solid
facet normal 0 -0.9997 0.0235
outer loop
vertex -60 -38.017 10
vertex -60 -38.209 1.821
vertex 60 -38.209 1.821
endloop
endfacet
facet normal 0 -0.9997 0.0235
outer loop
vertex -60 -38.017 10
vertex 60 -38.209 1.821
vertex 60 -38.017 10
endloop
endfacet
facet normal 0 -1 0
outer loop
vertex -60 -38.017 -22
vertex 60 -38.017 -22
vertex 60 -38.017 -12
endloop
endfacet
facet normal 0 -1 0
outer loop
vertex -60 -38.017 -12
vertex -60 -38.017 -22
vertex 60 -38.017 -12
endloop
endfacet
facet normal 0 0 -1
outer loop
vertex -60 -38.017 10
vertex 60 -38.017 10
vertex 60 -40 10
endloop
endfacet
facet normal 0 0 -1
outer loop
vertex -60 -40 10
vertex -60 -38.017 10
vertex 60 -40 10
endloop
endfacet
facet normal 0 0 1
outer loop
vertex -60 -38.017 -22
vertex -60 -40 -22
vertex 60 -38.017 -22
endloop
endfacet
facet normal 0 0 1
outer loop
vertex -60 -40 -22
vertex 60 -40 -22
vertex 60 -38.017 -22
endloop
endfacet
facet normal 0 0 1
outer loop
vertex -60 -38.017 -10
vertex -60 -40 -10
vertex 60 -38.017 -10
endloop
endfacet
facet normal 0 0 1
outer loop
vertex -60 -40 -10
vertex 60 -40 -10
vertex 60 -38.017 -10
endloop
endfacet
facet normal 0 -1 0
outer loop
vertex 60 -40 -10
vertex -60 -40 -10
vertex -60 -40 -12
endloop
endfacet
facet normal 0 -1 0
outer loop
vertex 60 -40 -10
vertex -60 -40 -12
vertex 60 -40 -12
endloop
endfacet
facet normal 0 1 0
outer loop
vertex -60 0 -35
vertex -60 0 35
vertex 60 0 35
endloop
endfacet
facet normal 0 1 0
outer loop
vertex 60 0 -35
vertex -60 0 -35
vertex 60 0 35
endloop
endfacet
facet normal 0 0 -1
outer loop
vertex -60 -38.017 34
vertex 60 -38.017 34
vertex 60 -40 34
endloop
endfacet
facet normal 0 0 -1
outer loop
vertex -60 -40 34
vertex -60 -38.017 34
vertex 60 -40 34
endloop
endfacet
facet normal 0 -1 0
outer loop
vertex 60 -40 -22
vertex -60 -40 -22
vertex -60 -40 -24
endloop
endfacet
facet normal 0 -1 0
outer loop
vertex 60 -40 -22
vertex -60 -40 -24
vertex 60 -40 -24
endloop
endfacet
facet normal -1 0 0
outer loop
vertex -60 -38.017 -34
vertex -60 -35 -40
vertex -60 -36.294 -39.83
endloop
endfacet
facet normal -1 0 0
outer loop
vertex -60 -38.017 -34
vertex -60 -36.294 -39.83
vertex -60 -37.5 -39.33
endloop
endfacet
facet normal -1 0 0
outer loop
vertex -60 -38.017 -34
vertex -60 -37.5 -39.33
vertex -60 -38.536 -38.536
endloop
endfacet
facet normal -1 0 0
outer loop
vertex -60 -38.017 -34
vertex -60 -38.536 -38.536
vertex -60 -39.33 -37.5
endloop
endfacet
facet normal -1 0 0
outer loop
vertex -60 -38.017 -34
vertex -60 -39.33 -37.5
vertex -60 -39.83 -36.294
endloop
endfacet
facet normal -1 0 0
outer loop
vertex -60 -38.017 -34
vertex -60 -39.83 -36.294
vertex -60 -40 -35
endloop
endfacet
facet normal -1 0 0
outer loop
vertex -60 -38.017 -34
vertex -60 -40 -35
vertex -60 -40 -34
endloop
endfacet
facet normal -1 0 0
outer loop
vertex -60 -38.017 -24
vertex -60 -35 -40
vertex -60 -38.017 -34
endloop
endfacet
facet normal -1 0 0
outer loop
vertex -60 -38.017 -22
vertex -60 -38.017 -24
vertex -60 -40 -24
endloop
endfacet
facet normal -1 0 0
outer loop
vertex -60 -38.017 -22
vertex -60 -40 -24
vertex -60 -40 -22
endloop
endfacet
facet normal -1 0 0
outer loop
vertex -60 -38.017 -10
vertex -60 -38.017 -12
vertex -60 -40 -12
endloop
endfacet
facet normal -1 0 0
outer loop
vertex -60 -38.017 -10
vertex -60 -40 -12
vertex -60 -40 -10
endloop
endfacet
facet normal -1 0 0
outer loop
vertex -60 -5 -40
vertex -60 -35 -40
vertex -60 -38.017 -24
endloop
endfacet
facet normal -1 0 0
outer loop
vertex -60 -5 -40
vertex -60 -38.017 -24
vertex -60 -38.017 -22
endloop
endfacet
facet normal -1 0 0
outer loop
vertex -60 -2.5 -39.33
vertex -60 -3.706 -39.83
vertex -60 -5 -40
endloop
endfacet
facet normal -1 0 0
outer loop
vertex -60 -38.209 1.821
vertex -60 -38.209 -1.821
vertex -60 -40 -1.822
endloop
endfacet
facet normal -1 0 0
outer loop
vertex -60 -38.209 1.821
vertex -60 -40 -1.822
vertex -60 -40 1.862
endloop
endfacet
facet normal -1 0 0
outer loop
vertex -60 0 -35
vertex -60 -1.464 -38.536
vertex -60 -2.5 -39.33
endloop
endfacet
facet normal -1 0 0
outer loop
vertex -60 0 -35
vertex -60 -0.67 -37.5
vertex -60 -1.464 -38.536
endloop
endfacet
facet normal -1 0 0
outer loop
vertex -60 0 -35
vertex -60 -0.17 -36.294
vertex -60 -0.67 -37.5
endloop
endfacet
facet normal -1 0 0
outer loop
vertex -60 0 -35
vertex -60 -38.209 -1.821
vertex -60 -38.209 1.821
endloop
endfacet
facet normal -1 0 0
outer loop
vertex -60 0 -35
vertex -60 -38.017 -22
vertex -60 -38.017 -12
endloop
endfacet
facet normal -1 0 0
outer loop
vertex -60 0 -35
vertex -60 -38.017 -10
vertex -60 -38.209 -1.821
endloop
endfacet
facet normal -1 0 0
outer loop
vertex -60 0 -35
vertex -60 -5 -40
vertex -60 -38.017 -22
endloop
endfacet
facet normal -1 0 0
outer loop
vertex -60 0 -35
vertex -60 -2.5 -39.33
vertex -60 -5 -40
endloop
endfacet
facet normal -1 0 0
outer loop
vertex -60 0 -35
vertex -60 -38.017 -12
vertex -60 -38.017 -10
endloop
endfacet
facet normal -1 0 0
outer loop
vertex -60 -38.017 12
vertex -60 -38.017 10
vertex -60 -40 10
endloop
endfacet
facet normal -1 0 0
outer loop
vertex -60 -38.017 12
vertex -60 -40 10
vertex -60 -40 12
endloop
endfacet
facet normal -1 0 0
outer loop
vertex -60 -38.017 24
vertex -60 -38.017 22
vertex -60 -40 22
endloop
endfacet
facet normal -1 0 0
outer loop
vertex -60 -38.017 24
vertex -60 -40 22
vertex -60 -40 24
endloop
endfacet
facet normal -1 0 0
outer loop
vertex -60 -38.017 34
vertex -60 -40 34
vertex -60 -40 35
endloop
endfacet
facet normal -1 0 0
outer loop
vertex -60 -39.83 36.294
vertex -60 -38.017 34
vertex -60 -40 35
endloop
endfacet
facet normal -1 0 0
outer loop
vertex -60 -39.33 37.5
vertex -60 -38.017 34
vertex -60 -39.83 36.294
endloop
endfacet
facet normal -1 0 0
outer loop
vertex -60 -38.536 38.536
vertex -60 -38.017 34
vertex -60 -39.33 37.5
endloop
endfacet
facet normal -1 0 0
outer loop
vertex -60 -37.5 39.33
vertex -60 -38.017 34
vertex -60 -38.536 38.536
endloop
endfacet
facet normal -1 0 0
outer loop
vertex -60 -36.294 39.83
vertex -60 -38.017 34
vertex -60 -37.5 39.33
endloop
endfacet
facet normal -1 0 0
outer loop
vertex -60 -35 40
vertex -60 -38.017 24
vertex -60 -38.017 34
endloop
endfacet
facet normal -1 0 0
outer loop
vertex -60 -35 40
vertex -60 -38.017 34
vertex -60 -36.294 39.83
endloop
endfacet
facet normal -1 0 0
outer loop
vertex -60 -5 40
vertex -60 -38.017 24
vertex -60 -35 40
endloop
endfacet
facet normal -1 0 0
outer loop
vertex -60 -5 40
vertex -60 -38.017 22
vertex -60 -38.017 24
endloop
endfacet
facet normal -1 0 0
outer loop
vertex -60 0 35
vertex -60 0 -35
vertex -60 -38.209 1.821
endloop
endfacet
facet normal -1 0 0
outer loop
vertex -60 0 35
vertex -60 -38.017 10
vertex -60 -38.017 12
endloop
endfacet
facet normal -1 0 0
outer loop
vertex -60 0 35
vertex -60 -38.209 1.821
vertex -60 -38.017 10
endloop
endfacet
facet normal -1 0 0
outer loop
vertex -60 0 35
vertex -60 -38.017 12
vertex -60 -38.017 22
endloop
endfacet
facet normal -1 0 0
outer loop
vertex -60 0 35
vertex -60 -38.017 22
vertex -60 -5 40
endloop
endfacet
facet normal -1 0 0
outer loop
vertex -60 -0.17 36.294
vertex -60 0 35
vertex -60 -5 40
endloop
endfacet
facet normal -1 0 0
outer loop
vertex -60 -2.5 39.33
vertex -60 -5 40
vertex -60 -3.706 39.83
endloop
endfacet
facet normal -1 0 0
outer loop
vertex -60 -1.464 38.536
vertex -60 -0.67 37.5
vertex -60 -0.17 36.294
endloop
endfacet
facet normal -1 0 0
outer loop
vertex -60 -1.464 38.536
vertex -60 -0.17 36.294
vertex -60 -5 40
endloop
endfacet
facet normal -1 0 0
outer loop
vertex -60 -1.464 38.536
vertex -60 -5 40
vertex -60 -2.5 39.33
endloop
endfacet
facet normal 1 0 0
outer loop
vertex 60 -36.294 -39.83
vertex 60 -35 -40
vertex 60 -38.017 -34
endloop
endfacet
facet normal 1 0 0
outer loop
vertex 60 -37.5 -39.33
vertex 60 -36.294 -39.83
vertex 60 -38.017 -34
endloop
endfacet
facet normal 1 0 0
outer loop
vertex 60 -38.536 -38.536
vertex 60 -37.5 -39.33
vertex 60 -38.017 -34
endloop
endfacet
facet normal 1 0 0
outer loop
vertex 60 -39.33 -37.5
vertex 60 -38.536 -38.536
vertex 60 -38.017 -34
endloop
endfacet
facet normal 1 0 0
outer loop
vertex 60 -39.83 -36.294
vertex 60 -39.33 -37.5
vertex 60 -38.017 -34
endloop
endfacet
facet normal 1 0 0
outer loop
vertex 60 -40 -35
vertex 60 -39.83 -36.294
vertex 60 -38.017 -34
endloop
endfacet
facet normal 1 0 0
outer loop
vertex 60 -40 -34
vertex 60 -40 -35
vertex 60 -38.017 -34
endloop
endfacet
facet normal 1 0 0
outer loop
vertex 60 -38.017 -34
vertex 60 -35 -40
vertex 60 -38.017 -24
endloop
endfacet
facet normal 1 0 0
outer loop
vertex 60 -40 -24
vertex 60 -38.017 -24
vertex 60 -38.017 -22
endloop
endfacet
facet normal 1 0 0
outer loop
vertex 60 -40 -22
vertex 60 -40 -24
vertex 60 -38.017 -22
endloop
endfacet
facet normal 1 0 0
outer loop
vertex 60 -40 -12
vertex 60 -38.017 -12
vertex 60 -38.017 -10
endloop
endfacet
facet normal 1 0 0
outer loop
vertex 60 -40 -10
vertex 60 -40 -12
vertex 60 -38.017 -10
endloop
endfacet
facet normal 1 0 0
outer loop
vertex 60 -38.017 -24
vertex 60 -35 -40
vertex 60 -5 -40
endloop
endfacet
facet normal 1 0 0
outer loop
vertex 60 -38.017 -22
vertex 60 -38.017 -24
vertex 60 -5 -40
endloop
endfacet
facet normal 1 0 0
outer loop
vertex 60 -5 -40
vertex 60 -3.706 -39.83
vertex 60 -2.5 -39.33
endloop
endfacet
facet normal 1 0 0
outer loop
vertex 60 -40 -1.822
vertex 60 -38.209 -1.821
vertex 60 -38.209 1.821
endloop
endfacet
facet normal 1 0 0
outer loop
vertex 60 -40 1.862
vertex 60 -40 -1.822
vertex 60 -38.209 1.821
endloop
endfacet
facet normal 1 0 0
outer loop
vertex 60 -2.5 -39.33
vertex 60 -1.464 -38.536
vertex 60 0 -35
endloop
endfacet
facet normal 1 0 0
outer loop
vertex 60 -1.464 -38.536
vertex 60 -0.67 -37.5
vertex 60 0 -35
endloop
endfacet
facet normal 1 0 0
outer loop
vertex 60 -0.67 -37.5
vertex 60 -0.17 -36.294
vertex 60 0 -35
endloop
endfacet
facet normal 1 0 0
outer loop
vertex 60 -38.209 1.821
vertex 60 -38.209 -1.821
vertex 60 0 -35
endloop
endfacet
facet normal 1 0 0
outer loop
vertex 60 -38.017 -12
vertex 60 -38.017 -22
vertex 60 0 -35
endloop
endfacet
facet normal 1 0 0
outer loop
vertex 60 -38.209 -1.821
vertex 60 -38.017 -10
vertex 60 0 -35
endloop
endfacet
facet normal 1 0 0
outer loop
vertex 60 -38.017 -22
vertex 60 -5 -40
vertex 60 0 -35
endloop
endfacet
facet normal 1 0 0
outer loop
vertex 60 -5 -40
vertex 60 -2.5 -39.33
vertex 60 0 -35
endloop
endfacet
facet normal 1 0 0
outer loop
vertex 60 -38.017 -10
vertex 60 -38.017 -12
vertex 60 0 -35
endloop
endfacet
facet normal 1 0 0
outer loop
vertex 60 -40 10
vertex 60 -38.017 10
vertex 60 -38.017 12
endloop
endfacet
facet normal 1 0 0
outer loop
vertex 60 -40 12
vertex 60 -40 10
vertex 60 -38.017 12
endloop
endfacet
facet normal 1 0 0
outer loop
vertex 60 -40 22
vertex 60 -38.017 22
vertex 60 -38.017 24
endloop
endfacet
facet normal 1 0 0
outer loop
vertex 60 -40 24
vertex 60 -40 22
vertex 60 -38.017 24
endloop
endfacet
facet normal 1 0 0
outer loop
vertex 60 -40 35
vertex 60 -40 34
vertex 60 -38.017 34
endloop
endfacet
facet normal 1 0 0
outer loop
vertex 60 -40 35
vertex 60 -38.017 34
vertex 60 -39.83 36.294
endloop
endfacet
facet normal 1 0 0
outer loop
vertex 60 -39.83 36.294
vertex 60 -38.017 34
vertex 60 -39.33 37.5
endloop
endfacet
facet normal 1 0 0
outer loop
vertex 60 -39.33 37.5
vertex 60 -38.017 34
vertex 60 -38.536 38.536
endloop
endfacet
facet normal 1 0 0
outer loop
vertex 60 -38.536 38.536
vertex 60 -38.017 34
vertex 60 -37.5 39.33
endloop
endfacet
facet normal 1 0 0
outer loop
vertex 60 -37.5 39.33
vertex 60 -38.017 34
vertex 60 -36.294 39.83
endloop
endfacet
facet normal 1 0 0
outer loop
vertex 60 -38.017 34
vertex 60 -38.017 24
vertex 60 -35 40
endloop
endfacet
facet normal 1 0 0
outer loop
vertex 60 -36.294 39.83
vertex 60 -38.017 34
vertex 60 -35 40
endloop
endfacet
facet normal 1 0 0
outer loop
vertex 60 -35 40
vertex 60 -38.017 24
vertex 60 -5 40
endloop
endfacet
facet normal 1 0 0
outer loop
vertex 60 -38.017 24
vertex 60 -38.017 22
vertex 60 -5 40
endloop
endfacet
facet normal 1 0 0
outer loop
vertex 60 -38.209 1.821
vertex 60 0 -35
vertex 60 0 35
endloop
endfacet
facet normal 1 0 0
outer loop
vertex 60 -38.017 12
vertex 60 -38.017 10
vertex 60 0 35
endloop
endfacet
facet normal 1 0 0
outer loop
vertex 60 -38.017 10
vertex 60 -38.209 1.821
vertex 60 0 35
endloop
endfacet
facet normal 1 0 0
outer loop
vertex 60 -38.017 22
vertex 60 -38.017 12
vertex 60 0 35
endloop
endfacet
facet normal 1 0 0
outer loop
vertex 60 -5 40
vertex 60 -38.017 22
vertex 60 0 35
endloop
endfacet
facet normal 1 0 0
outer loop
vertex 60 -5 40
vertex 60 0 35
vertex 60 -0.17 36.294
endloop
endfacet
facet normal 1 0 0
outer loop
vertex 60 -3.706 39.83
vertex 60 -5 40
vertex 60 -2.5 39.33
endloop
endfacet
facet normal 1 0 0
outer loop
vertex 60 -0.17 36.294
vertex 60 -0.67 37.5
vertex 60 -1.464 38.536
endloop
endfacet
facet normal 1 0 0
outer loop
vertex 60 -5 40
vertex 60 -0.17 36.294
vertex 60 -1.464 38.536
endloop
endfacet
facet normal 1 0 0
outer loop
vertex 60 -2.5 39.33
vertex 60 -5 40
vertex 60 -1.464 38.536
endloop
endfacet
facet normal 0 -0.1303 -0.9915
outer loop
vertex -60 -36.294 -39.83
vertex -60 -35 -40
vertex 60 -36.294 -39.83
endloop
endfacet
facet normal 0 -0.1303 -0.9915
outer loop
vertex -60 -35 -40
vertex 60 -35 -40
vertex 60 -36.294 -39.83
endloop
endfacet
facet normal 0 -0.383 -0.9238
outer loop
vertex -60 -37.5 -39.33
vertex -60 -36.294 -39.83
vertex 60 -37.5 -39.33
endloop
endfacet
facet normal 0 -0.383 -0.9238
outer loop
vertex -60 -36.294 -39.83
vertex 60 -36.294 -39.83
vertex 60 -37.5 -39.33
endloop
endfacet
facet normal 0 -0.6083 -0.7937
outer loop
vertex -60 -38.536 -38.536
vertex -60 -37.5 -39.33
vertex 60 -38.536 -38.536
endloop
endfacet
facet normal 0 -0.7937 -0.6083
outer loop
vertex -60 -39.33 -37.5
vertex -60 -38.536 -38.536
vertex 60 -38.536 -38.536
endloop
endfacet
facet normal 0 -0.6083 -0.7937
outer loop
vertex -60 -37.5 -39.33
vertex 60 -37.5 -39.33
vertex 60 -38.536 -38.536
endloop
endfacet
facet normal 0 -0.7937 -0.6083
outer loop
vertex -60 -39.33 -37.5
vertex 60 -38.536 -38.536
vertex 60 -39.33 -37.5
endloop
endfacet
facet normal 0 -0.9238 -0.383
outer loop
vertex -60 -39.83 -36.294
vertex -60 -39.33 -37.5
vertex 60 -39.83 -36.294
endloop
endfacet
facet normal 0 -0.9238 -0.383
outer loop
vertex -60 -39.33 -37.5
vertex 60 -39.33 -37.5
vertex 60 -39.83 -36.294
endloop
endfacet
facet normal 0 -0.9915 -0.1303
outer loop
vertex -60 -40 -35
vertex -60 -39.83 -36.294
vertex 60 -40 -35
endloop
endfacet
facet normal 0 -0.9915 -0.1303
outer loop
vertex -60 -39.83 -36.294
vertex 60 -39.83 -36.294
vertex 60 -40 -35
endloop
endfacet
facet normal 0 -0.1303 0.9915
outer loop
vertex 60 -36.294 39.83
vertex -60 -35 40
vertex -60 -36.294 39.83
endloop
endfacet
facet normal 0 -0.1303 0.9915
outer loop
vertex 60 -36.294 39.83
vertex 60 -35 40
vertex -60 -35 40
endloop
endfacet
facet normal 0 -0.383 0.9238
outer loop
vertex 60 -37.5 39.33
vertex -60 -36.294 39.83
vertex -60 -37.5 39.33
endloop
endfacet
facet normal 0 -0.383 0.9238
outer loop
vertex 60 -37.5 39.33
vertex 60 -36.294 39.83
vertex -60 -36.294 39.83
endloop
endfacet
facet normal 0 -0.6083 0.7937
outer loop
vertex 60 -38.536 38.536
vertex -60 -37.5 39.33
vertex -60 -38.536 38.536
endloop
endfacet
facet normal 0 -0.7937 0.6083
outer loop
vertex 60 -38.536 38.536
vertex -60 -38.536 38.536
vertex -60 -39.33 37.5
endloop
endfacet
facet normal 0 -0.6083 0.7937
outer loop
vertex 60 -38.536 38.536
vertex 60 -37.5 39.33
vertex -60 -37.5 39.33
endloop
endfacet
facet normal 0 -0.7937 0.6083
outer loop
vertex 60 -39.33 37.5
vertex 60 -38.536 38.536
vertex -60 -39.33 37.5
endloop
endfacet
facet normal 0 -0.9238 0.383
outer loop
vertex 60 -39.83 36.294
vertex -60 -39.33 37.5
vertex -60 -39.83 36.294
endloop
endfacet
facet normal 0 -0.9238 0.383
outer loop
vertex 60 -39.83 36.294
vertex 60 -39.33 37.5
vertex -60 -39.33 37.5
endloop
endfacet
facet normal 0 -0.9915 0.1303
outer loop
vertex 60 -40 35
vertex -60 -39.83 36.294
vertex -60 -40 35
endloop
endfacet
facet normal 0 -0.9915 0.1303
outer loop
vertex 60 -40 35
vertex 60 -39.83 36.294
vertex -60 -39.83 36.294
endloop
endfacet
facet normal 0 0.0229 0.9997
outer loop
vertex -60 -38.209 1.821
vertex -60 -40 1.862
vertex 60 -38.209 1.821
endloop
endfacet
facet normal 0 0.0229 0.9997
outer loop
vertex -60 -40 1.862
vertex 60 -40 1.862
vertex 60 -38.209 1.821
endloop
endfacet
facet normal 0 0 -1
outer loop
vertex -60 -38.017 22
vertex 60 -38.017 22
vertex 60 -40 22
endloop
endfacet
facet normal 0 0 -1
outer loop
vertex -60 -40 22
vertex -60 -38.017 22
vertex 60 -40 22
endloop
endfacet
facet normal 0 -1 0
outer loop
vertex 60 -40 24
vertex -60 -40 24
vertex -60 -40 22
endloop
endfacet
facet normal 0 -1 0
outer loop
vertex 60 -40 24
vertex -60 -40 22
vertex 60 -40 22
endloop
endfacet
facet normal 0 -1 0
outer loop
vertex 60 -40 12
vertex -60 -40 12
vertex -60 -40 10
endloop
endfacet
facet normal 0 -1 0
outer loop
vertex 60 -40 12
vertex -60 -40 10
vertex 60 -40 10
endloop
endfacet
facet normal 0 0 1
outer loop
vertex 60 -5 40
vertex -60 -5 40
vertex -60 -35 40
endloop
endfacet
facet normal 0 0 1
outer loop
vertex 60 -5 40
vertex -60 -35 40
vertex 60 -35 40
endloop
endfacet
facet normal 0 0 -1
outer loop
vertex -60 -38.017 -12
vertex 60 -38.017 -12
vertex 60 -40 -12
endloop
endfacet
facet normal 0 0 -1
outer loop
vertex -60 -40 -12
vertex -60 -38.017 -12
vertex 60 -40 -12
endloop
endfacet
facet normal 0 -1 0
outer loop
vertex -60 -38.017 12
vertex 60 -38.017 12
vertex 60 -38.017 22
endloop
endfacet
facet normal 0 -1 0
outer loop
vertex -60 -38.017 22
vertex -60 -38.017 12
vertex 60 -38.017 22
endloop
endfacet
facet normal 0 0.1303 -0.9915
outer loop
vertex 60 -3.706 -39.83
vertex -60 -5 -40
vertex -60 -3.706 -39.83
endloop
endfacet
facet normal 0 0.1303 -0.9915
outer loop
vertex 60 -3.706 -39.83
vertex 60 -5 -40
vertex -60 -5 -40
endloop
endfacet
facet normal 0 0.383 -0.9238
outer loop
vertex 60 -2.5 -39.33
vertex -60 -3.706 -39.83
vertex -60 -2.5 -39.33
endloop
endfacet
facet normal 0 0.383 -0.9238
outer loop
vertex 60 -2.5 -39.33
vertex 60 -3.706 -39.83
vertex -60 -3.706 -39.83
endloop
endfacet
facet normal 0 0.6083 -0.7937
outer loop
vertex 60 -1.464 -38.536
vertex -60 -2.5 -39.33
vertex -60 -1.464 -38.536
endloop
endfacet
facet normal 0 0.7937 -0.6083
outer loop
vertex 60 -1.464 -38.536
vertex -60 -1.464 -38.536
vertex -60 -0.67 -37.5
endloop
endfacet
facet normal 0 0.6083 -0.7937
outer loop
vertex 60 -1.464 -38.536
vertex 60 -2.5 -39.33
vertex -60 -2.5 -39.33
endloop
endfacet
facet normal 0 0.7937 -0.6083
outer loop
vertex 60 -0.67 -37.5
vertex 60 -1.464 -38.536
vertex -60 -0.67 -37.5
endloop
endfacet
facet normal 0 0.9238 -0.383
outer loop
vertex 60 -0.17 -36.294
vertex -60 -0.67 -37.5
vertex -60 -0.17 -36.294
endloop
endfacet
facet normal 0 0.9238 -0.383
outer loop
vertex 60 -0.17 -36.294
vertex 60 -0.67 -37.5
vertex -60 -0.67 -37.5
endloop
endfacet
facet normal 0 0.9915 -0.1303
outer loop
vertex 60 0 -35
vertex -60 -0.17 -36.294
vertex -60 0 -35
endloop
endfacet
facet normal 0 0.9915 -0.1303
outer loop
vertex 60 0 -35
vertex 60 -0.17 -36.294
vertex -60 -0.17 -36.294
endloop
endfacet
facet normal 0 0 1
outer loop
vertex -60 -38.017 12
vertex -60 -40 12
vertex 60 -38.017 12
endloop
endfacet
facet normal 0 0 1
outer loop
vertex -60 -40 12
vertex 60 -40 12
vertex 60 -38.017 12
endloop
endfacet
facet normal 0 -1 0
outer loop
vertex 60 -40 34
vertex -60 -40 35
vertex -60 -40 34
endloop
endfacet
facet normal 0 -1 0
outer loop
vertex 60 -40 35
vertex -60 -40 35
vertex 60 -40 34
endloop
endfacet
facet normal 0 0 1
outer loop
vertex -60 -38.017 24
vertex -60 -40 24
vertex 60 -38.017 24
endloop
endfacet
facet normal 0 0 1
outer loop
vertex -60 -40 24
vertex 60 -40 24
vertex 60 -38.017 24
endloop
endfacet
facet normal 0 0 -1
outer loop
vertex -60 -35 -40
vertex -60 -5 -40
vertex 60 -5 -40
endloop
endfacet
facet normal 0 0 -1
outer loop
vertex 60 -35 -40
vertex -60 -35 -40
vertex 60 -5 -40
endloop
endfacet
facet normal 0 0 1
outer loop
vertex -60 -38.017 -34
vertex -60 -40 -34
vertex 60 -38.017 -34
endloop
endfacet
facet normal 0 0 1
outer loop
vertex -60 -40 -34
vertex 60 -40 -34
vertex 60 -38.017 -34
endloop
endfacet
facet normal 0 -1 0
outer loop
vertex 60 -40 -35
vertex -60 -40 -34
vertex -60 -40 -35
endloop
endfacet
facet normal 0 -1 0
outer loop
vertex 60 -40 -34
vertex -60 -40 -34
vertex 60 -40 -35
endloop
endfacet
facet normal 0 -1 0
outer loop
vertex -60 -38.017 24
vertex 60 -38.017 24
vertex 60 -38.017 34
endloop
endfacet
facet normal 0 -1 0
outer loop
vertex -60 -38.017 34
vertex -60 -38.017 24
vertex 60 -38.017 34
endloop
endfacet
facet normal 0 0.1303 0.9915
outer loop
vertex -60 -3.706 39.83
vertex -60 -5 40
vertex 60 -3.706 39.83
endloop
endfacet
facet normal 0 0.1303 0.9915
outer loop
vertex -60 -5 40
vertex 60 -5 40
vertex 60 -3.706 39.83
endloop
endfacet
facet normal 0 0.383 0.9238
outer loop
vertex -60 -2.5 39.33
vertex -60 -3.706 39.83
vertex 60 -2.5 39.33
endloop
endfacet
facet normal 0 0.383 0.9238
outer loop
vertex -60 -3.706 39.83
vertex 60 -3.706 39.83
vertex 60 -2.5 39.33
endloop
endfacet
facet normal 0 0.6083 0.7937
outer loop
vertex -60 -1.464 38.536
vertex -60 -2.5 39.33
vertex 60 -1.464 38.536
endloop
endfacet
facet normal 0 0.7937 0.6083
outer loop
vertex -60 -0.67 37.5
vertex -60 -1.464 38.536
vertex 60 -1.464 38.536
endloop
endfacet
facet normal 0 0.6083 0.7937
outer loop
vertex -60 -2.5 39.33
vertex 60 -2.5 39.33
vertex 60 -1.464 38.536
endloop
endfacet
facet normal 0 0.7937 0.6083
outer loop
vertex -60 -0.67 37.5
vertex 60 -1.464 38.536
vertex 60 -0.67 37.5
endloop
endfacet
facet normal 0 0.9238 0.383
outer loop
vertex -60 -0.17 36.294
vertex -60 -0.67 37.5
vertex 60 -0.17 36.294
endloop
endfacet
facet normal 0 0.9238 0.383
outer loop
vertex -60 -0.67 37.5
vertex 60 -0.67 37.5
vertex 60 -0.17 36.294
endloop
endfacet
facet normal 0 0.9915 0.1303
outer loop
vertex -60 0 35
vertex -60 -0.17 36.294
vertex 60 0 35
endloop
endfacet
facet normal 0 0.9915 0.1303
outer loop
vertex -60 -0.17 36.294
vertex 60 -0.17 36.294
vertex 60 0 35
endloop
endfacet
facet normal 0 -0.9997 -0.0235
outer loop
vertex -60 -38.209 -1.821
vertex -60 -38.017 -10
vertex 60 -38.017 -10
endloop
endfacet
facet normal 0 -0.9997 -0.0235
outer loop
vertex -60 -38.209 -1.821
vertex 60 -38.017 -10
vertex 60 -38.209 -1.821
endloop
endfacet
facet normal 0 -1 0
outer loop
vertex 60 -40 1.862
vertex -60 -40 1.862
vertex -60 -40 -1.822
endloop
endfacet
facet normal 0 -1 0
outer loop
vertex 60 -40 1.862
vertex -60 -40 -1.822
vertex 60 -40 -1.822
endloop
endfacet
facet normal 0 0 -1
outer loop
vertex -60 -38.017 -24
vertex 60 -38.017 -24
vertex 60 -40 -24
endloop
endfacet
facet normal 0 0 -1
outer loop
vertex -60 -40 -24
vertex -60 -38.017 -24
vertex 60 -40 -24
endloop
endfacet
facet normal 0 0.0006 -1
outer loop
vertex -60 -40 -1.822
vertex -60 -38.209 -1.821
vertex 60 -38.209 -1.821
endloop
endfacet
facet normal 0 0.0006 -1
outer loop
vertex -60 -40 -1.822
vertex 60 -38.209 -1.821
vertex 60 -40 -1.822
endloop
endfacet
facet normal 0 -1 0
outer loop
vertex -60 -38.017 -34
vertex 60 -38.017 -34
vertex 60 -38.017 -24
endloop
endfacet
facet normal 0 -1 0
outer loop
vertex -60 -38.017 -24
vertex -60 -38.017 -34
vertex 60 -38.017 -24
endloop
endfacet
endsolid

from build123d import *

# Parameters (mm, degrees)
F0_W     = 120
F0_H     = 80
F1_DEPTH = 40
F2_R     = 5
F4_DEPTH = 100


with BuildPart() as f1:
    # F0 (on Front) → F1 (new body)
    with BuildSketch(Plane.XZ):
        Rectangle(F0_W, F0_H)
    extrude(amount=F1_DEPTH)

    # F2
    f2_edges = [f1.edges().sort_by_distance(p)[0] for p in [
        (0, -40, 40),
        (0, -40, -40),
        (0, 0, 40),
        (0, 0, -40),
    ]]
    fillet(f2_edges, radius=F2_R)

    # F3 (on Right) → F4 (cut, symmetric)
    with BuildSketch(Plane.YZ):
        Polygon((-41.373981, 1.894575), (-38.208514, 1.82053), (-38.017184, 10), (-41.193411, 10), (-41.193411, 12), (-38.017184, 12), (-38.017184, 22), (-41.193411, 22), (-41.193411, 24), (-38.017184, 24), (-38.017184, 34), (-44.775072, 34), (-44.878796, 1.82053), (-44.878796, -1.82053), (-44.775072, -34), (-38.017184, -34), (-38.017184, -24), (-41.193411, -24), (-41.193411, -22), (-38.017184, -22), (-38.017184, -12), (-41.193411, -12), (-41.193411, -10), (-38.017184, -10), (-38.208514, -1.82053), (-41.373981, -1.823795), align=None)
    extrude(amount=F4_DEPTH, both=True, mode=Mode.SUBTRACT)


solid = f1.part
